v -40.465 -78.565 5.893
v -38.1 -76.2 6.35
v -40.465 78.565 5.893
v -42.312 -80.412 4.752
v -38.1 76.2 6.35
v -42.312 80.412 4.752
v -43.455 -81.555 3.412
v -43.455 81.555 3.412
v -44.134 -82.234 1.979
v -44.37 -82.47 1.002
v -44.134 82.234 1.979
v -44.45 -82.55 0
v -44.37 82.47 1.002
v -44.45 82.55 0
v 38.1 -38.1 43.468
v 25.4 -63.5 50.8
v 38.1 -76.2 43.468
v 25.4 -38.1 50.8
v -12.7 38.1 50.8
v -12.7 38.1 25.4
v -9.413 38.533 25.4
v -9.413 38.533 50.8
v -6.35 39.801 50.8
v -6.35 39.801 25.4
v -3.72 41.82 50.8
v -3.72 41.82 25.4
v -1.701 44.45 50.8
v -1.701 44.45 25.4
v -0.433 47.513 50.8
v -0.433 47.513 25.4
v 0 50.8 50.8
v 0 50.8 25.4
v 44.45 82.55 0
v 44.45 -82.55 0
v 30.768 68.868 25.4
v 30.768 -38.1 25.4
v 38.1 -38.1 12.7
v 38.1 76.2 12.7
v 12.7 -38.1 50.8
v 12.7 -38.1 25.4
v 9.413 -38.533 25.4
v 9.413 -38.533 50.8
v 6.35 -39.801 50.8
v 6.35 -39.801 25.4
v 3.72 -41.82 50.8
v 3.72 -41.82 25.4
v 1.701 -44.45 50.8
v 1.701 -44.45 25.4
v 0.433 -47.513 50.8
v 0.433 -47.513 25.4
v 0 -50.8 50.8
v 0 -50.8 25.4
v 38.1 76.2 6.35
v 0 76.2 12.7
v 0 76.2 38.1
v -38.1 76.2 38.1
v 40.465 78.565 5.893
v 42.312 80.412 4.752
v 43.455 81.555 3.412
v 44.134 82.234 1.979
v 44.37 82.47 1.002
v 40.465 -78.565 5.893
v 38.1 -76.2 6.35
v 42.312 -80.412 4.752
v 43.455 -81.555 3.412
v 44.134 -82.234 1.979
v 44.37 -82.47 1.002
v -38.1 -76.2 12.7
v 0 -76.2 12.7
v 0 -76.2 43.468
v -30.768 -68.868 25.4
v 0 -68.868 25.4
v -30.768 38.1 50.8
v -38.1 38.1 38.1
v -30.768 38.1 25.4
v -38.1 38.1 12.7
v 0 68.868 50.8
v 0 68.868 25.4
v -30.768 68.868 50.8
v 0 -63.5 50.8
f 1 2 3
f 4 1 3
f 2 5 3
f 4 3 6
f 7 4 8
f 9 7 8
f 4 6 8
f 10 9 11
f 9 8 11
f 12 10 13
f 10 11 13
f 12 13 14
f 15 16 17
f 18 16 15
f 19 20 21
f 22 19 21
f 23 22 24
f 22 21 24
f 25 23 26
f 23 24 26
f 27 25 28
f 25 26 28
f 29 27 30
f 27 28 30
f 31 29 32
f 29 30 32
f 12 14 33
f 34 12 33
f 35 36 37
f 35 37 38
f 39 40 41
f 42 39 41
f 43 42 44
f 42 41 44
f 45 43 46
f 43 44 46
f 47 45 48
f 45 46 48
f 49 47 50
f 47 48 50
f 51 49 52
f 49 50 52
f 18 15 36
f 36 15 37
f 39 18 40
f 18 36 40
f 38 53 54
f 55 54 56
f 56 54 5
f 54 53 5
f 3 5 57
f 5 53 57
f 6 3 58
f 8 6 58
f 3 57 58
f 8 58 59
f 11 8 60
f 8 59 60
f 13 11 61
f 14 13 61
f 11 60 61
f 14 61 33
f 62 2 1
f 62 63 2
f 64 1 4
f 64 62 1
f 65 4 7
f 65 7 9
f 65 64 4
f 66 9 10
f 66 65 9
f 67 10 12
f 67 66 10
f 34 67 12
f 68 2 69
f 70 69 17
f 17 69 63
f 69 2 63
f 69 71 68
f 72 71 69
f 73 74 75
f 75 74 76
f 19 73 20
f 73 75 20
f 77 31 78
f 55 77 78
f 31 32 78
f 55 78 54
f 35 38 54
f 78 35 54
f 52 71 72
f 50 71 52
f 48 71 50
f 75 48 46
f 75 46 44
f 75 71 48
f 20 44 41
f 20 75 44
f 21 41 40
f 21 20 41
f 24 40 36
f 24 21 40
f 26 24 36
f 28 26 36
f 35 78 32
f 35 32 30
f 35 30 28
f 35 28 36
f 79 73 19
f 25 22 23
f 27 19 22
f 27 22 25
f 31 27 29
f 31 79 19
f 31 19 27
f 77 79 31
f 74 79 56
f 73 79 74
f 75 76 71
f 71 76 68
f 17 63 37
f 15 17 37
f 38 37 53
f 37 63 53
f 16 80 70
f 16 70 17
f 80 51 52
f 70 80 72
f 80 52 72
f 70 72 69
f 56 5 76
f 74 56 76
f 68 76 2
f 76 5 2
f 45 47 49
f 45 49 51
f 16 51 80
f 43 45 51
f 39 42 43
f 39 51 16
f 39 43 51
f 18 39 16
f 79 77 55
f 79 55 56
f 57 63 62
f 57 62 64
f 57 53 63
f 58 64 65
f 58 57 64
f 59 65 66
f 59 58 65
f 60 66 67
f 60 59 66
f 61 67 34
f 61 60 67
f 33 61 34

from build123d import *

# Parameters (mm, degrees)
F0_W        = 88.9
F0_H        = 165.1
F1_DEPTH    = 6.35
F2_DEPTH    = 25.4
F3_DEPTH    = 50.8
F4_C1_SIZE2 = 7.3323484187
F4_C1_SIZE  = 12.7
F4_C2_SIZE2 = 7.3323484187
F4_C2_SIZE  = 12.7
F4_C3_SIZE2 = 12.7
F4_C3_SIZE  = 7.3323484187
F4_C4_SIZE2 = 12.7
F4_C4_SIZE  = 7.3323484187
F5_R        = 6.34999
F6_C1_SIZE2 = 7.3323484187
F6_C1_SIZE  = 12.7
F6_C2_SIZE2 = 7.3323484187
F6_C2_SIZE  = 12.7
F6_C3_SIZE2 = 12.7
F6_C3_SIZE  = 7.3323484187
F6_C4_SIZE2 = 12.7
F6_C4_SIZE  = 7.3323484187


# Not quite as in the source:
# - a fillet or chamfer is up to 0.001 mm smaller than in the source, because OpenCascade refuses the exact size


with BuildPart() as f1:
    # F0 (on Top) → F1 (new body)
    with BuildSketch(Plane.XY):
        Rectangle(F0_W, F0_H)
        Polygon((0, 76.2), (38.1, 76.2), (38.1, -38.1), (38.1, -76.2), (0, -76.2), (-38.1, -76.2), (-38.1, 38.1), (-38.1, 76.2), align=None, mode=Mode.SUBTRACT)
        with BuildLine():
            Line((0, 50.8), (0, 76.2))
            Line((0, 76.2), (-38.1, 76.2))
            Line((-38.1, 76.2), (-38.1, 38.1))
            Line((-38.1, 38.1), (-12.7, 38.1))
            ThreePointArc((-12.7, 38.1), (-3.7197438789, 41.8197438789), (0, 50.8))
        make_face()
        with BuildLine():
            Line((38.1, -38.1), (38.1, 76.2))
            Line((38.1, 76.2), (0, 76.2))
            Line((0, 76.2), (0, 50.8))
            ThreePointArc((0, 50.8), (-3.7197438789, 41.8197438789), (-12.7, 38.1))
            Line((-12.7, 38.1), (-38.1, 38.1))
            Line((-38.1, 38.1), (-38.1, -76.2))
            Line((-38.1, -76.2), (0, -76.2))
            Line((0, -76.2), (0, -50.8))
            ThreePointArc((0, -50.8), (3.7197438789, -41.8197438789), (12.7, -38.1))
            Line((12.7, -38.1), (38.1, -38.1))
        make_face()
        with BuildLine():
            Line((38.1, -76.2), (38.1, -38.1))
            Line((38.1, -38.1), (12.7, -38.1))
            ThreePointArc((12.7, -38.1), (3.7197438789, -41.8197438789), (0, -50.8))
            Line((0, -50.8), (0, -76.2))
            Line((0, -76.2), (38.1, -76.2))
        make_face()
    extrude(amount=F1_DEPTH)

    # F0 (on Top) → F2 (join)
    with BuildSketch(Plane.XY):
        with BuildLine():
            Line((38.1, -38.1), (38.1, 76.2))
            Line((38.1, 76.2), (0, 76.2))
            Line((0, 76.2), (0, 50.8))
            ThreePointArc((0, 50.8), (-3.7197438789, 41.8197438789), (-12.7, 38.1))
            Line((-12.7, 38.1), (-38.1, 38.1))
            Line((-38.1, 38.1), (-38.1, -76.2))
            Line((-38.1, -76.2), (0, -76.2))
            Line((0, -76.2), (0, -50.8))
            ThreePointArc((0, -50.8), (3.7197438789, -41.8197438789), (12.7, -38.1))
            Line((12.7, -38.1), (38.1, -38.1))
        make_face()
        with BuildLine():
            Line((0, 50.8), (0, 76.2))
            Line((0, 76.2), (-38.1, 76.2))
            Line((-38.1, 76.2), (-38.1, 38.1))
            Line((-38.1, 38.1), (-12.7, 38.1))
            ThreePointArc((-12.7, 38.1), (-3.7197438789, 41.8197438789), (0, 50.8))
        make_face()
        with BuildLine():
            Line((38.1, -76.2), (38.1, -38.1))
            Line((38.1, -38.1), (12.7, -38.1))
            ThreePointArc((12.7, -38.1), (3.7197438789, -41.8197438789), (0, -50.8))
            Line((0, -50.8), (0, -76.2))
            Line((0, -76.2), (38.1, -76.2))
        make_face()
    extrude(amount=F2_DEPTH)

    # F0 (on Top) → F3 (join)
    with BuildSketch(Plane.XY):
        with BuildLine():
            Line((0, 50.8), (0, 76.2))
            Line((0, 76.2), (-38.1, 76.2))
            Line((-38.1, 76.2), (-38.1, 38.1))
            Line((-38.1, 38.1), (-12.7, 38.1))
            ThreePointArc((-12.7, 38.1), (-3.7197438789, 41.8197438789), (0, 50.8))
        make_face()
        with BuildLine():
            Line((38.1, -76.2), (38.1, -38.1))
            Line((38.1, -38.1), (12.7, -38.1))
            ThreePointArc((12.7, -38.1), (3.7197438789, -41.8197438789), (0, -50.8))
            Line((0, -50.8), (0, -76.2))
            Line((0, -76.2), (38.1, -76.2))
        make_face()
    extrude(amount=F3_DEPTH)

    # F4: chamfer of 12.7 x 7.3323484187 on 4 edges, made by hand

    # F4_c1
    f4_c1_edges = [f1.edges().sort_by_distance(p)[0] for p in [
        (-19.05, -76.2, 25.4),
    ]]
    f4_c1_side = f1.faces().sort_by_distance((-19.05, -76.2, 25.2533530316))[0]
    chamfer(f4_c1_edges, length=F4_C1_SIZE, length2=F4_C1_SIZE2, reference=f4_c1_side)

    # F4_c2
    f4_c2_edges = [f1.edges().sort_by_distance(p)[0] for p in [
        (38.1, 19.05, 25.4),
    ]]
    f4_c2_side = f1.faces().sort_by_distance((38.1, 19.05, 25.2533530316))[0]
    chamfer(f4_c2_edges, length=F4_C2_SIZE, length2=F4_C2_SIZE2, reference=f4_c2_side)

    # F4_c3
    f4_c3_edges = [f1.edges().sort_by_distance(p)[0] for p in [
        (-38.1, -15.3838257906, 25.4),
    ]]
    f4_c3_side = f1.faces().sort_by_distance((-37.9533530316, -15.3838257906, 25.4))[0]
    chamfer(f4_c3_edges, length=F4_C3_SIZE, length2=F4_C3_SIZE2, reference=f4_c3_side)

    # F4_c4
    f4_c4_edges = [f1.edges().sort_by_distance(p)[0] for p in [
        (15.3838257906, 76.2, 25.4),
    ]]
    f4_c4_side = f1.faces().sort_by_distance((15.3838257906, 76.0533530316, 25.4))[0]
    chamfer(f4_c4_edges, length=F4_C4_SIZE, length2=F4_C4_SIZE2, reference=f4_c4_side)

    # F5 (radius 6.35 in the source; OpenCascade refuses exactly that, so slightly less here)
    f5_edges = [f1.edges().sort_by_distance(p)[0] for p in [
        (0, 82.55, 6.35),
        (44.45, 0, 6.35),
        (-44.45, 0, 6.35),
        (0, -82.55, 6.35),
    ]]
    fillet(f5_edges, radius=F5_R)

    # F6: chamfer of 12.7 x 7.3323484187 on 4 edges, made by hand

    # F6_c1
    f6_c1_edges = [f1.edges().sort_by_distance(p)[0] for p in [
        (-38.1, 57.15, 50.8),
    ]]
    f6_c1_side = f1.faces().sort_by_distance((-38.1, 57.15, 50.6533530316))[0]
    chamfer(f6_c1_edges, length=F6_C1_SIZE, length2=F6_C1_SIZE2, reference=f6_c1_side)

    # F6_c2
    f6_c2_edges = [f1.edges().sort_by_distance(p)[0] for p in [
        (-15.3838257906, 76.2, 50.8),
    ]]
    f6_c2_side = f1.faces().sort_by_distance((-15.3838257906, 76.2, 50.6533530316))[0]
    chamfer(f6_c2_edges, length=F6_C2_SIZE, length2=F6_C2_SIZE2, reference=f6_c2_side)

    # F6_c3
    f6_c3_edges = [f1.edges().sort_by_distance(p)[0] for p in [
        (38.1, -57.15, 50.8),
    ]]
    f6_c3_side = f1.faces().sort_by_distance((38.1, -57.15, 50.6533530316))[0]
    chamfer(f6_c3_edges, length=F6_C3_SIZE, length2=F6_C3_SIZE2, reference=f6_c3_side)

    # F6_c4
    f6_c4_edges = [f1.edges().sort_by_distance(p)[0] for p in [
        (12.7, -76.2, 50.8),
    ]]
    f6_c4_side = f1.faces().sort_by_distance((12.7, -76.2, 50.6533530316))[0]
    chamfer(f6_c4_edges, length=F6_C4_SIZE, length2=F6_C4_SIZE2, reference=f6_c4_side)


solid = f1.part
